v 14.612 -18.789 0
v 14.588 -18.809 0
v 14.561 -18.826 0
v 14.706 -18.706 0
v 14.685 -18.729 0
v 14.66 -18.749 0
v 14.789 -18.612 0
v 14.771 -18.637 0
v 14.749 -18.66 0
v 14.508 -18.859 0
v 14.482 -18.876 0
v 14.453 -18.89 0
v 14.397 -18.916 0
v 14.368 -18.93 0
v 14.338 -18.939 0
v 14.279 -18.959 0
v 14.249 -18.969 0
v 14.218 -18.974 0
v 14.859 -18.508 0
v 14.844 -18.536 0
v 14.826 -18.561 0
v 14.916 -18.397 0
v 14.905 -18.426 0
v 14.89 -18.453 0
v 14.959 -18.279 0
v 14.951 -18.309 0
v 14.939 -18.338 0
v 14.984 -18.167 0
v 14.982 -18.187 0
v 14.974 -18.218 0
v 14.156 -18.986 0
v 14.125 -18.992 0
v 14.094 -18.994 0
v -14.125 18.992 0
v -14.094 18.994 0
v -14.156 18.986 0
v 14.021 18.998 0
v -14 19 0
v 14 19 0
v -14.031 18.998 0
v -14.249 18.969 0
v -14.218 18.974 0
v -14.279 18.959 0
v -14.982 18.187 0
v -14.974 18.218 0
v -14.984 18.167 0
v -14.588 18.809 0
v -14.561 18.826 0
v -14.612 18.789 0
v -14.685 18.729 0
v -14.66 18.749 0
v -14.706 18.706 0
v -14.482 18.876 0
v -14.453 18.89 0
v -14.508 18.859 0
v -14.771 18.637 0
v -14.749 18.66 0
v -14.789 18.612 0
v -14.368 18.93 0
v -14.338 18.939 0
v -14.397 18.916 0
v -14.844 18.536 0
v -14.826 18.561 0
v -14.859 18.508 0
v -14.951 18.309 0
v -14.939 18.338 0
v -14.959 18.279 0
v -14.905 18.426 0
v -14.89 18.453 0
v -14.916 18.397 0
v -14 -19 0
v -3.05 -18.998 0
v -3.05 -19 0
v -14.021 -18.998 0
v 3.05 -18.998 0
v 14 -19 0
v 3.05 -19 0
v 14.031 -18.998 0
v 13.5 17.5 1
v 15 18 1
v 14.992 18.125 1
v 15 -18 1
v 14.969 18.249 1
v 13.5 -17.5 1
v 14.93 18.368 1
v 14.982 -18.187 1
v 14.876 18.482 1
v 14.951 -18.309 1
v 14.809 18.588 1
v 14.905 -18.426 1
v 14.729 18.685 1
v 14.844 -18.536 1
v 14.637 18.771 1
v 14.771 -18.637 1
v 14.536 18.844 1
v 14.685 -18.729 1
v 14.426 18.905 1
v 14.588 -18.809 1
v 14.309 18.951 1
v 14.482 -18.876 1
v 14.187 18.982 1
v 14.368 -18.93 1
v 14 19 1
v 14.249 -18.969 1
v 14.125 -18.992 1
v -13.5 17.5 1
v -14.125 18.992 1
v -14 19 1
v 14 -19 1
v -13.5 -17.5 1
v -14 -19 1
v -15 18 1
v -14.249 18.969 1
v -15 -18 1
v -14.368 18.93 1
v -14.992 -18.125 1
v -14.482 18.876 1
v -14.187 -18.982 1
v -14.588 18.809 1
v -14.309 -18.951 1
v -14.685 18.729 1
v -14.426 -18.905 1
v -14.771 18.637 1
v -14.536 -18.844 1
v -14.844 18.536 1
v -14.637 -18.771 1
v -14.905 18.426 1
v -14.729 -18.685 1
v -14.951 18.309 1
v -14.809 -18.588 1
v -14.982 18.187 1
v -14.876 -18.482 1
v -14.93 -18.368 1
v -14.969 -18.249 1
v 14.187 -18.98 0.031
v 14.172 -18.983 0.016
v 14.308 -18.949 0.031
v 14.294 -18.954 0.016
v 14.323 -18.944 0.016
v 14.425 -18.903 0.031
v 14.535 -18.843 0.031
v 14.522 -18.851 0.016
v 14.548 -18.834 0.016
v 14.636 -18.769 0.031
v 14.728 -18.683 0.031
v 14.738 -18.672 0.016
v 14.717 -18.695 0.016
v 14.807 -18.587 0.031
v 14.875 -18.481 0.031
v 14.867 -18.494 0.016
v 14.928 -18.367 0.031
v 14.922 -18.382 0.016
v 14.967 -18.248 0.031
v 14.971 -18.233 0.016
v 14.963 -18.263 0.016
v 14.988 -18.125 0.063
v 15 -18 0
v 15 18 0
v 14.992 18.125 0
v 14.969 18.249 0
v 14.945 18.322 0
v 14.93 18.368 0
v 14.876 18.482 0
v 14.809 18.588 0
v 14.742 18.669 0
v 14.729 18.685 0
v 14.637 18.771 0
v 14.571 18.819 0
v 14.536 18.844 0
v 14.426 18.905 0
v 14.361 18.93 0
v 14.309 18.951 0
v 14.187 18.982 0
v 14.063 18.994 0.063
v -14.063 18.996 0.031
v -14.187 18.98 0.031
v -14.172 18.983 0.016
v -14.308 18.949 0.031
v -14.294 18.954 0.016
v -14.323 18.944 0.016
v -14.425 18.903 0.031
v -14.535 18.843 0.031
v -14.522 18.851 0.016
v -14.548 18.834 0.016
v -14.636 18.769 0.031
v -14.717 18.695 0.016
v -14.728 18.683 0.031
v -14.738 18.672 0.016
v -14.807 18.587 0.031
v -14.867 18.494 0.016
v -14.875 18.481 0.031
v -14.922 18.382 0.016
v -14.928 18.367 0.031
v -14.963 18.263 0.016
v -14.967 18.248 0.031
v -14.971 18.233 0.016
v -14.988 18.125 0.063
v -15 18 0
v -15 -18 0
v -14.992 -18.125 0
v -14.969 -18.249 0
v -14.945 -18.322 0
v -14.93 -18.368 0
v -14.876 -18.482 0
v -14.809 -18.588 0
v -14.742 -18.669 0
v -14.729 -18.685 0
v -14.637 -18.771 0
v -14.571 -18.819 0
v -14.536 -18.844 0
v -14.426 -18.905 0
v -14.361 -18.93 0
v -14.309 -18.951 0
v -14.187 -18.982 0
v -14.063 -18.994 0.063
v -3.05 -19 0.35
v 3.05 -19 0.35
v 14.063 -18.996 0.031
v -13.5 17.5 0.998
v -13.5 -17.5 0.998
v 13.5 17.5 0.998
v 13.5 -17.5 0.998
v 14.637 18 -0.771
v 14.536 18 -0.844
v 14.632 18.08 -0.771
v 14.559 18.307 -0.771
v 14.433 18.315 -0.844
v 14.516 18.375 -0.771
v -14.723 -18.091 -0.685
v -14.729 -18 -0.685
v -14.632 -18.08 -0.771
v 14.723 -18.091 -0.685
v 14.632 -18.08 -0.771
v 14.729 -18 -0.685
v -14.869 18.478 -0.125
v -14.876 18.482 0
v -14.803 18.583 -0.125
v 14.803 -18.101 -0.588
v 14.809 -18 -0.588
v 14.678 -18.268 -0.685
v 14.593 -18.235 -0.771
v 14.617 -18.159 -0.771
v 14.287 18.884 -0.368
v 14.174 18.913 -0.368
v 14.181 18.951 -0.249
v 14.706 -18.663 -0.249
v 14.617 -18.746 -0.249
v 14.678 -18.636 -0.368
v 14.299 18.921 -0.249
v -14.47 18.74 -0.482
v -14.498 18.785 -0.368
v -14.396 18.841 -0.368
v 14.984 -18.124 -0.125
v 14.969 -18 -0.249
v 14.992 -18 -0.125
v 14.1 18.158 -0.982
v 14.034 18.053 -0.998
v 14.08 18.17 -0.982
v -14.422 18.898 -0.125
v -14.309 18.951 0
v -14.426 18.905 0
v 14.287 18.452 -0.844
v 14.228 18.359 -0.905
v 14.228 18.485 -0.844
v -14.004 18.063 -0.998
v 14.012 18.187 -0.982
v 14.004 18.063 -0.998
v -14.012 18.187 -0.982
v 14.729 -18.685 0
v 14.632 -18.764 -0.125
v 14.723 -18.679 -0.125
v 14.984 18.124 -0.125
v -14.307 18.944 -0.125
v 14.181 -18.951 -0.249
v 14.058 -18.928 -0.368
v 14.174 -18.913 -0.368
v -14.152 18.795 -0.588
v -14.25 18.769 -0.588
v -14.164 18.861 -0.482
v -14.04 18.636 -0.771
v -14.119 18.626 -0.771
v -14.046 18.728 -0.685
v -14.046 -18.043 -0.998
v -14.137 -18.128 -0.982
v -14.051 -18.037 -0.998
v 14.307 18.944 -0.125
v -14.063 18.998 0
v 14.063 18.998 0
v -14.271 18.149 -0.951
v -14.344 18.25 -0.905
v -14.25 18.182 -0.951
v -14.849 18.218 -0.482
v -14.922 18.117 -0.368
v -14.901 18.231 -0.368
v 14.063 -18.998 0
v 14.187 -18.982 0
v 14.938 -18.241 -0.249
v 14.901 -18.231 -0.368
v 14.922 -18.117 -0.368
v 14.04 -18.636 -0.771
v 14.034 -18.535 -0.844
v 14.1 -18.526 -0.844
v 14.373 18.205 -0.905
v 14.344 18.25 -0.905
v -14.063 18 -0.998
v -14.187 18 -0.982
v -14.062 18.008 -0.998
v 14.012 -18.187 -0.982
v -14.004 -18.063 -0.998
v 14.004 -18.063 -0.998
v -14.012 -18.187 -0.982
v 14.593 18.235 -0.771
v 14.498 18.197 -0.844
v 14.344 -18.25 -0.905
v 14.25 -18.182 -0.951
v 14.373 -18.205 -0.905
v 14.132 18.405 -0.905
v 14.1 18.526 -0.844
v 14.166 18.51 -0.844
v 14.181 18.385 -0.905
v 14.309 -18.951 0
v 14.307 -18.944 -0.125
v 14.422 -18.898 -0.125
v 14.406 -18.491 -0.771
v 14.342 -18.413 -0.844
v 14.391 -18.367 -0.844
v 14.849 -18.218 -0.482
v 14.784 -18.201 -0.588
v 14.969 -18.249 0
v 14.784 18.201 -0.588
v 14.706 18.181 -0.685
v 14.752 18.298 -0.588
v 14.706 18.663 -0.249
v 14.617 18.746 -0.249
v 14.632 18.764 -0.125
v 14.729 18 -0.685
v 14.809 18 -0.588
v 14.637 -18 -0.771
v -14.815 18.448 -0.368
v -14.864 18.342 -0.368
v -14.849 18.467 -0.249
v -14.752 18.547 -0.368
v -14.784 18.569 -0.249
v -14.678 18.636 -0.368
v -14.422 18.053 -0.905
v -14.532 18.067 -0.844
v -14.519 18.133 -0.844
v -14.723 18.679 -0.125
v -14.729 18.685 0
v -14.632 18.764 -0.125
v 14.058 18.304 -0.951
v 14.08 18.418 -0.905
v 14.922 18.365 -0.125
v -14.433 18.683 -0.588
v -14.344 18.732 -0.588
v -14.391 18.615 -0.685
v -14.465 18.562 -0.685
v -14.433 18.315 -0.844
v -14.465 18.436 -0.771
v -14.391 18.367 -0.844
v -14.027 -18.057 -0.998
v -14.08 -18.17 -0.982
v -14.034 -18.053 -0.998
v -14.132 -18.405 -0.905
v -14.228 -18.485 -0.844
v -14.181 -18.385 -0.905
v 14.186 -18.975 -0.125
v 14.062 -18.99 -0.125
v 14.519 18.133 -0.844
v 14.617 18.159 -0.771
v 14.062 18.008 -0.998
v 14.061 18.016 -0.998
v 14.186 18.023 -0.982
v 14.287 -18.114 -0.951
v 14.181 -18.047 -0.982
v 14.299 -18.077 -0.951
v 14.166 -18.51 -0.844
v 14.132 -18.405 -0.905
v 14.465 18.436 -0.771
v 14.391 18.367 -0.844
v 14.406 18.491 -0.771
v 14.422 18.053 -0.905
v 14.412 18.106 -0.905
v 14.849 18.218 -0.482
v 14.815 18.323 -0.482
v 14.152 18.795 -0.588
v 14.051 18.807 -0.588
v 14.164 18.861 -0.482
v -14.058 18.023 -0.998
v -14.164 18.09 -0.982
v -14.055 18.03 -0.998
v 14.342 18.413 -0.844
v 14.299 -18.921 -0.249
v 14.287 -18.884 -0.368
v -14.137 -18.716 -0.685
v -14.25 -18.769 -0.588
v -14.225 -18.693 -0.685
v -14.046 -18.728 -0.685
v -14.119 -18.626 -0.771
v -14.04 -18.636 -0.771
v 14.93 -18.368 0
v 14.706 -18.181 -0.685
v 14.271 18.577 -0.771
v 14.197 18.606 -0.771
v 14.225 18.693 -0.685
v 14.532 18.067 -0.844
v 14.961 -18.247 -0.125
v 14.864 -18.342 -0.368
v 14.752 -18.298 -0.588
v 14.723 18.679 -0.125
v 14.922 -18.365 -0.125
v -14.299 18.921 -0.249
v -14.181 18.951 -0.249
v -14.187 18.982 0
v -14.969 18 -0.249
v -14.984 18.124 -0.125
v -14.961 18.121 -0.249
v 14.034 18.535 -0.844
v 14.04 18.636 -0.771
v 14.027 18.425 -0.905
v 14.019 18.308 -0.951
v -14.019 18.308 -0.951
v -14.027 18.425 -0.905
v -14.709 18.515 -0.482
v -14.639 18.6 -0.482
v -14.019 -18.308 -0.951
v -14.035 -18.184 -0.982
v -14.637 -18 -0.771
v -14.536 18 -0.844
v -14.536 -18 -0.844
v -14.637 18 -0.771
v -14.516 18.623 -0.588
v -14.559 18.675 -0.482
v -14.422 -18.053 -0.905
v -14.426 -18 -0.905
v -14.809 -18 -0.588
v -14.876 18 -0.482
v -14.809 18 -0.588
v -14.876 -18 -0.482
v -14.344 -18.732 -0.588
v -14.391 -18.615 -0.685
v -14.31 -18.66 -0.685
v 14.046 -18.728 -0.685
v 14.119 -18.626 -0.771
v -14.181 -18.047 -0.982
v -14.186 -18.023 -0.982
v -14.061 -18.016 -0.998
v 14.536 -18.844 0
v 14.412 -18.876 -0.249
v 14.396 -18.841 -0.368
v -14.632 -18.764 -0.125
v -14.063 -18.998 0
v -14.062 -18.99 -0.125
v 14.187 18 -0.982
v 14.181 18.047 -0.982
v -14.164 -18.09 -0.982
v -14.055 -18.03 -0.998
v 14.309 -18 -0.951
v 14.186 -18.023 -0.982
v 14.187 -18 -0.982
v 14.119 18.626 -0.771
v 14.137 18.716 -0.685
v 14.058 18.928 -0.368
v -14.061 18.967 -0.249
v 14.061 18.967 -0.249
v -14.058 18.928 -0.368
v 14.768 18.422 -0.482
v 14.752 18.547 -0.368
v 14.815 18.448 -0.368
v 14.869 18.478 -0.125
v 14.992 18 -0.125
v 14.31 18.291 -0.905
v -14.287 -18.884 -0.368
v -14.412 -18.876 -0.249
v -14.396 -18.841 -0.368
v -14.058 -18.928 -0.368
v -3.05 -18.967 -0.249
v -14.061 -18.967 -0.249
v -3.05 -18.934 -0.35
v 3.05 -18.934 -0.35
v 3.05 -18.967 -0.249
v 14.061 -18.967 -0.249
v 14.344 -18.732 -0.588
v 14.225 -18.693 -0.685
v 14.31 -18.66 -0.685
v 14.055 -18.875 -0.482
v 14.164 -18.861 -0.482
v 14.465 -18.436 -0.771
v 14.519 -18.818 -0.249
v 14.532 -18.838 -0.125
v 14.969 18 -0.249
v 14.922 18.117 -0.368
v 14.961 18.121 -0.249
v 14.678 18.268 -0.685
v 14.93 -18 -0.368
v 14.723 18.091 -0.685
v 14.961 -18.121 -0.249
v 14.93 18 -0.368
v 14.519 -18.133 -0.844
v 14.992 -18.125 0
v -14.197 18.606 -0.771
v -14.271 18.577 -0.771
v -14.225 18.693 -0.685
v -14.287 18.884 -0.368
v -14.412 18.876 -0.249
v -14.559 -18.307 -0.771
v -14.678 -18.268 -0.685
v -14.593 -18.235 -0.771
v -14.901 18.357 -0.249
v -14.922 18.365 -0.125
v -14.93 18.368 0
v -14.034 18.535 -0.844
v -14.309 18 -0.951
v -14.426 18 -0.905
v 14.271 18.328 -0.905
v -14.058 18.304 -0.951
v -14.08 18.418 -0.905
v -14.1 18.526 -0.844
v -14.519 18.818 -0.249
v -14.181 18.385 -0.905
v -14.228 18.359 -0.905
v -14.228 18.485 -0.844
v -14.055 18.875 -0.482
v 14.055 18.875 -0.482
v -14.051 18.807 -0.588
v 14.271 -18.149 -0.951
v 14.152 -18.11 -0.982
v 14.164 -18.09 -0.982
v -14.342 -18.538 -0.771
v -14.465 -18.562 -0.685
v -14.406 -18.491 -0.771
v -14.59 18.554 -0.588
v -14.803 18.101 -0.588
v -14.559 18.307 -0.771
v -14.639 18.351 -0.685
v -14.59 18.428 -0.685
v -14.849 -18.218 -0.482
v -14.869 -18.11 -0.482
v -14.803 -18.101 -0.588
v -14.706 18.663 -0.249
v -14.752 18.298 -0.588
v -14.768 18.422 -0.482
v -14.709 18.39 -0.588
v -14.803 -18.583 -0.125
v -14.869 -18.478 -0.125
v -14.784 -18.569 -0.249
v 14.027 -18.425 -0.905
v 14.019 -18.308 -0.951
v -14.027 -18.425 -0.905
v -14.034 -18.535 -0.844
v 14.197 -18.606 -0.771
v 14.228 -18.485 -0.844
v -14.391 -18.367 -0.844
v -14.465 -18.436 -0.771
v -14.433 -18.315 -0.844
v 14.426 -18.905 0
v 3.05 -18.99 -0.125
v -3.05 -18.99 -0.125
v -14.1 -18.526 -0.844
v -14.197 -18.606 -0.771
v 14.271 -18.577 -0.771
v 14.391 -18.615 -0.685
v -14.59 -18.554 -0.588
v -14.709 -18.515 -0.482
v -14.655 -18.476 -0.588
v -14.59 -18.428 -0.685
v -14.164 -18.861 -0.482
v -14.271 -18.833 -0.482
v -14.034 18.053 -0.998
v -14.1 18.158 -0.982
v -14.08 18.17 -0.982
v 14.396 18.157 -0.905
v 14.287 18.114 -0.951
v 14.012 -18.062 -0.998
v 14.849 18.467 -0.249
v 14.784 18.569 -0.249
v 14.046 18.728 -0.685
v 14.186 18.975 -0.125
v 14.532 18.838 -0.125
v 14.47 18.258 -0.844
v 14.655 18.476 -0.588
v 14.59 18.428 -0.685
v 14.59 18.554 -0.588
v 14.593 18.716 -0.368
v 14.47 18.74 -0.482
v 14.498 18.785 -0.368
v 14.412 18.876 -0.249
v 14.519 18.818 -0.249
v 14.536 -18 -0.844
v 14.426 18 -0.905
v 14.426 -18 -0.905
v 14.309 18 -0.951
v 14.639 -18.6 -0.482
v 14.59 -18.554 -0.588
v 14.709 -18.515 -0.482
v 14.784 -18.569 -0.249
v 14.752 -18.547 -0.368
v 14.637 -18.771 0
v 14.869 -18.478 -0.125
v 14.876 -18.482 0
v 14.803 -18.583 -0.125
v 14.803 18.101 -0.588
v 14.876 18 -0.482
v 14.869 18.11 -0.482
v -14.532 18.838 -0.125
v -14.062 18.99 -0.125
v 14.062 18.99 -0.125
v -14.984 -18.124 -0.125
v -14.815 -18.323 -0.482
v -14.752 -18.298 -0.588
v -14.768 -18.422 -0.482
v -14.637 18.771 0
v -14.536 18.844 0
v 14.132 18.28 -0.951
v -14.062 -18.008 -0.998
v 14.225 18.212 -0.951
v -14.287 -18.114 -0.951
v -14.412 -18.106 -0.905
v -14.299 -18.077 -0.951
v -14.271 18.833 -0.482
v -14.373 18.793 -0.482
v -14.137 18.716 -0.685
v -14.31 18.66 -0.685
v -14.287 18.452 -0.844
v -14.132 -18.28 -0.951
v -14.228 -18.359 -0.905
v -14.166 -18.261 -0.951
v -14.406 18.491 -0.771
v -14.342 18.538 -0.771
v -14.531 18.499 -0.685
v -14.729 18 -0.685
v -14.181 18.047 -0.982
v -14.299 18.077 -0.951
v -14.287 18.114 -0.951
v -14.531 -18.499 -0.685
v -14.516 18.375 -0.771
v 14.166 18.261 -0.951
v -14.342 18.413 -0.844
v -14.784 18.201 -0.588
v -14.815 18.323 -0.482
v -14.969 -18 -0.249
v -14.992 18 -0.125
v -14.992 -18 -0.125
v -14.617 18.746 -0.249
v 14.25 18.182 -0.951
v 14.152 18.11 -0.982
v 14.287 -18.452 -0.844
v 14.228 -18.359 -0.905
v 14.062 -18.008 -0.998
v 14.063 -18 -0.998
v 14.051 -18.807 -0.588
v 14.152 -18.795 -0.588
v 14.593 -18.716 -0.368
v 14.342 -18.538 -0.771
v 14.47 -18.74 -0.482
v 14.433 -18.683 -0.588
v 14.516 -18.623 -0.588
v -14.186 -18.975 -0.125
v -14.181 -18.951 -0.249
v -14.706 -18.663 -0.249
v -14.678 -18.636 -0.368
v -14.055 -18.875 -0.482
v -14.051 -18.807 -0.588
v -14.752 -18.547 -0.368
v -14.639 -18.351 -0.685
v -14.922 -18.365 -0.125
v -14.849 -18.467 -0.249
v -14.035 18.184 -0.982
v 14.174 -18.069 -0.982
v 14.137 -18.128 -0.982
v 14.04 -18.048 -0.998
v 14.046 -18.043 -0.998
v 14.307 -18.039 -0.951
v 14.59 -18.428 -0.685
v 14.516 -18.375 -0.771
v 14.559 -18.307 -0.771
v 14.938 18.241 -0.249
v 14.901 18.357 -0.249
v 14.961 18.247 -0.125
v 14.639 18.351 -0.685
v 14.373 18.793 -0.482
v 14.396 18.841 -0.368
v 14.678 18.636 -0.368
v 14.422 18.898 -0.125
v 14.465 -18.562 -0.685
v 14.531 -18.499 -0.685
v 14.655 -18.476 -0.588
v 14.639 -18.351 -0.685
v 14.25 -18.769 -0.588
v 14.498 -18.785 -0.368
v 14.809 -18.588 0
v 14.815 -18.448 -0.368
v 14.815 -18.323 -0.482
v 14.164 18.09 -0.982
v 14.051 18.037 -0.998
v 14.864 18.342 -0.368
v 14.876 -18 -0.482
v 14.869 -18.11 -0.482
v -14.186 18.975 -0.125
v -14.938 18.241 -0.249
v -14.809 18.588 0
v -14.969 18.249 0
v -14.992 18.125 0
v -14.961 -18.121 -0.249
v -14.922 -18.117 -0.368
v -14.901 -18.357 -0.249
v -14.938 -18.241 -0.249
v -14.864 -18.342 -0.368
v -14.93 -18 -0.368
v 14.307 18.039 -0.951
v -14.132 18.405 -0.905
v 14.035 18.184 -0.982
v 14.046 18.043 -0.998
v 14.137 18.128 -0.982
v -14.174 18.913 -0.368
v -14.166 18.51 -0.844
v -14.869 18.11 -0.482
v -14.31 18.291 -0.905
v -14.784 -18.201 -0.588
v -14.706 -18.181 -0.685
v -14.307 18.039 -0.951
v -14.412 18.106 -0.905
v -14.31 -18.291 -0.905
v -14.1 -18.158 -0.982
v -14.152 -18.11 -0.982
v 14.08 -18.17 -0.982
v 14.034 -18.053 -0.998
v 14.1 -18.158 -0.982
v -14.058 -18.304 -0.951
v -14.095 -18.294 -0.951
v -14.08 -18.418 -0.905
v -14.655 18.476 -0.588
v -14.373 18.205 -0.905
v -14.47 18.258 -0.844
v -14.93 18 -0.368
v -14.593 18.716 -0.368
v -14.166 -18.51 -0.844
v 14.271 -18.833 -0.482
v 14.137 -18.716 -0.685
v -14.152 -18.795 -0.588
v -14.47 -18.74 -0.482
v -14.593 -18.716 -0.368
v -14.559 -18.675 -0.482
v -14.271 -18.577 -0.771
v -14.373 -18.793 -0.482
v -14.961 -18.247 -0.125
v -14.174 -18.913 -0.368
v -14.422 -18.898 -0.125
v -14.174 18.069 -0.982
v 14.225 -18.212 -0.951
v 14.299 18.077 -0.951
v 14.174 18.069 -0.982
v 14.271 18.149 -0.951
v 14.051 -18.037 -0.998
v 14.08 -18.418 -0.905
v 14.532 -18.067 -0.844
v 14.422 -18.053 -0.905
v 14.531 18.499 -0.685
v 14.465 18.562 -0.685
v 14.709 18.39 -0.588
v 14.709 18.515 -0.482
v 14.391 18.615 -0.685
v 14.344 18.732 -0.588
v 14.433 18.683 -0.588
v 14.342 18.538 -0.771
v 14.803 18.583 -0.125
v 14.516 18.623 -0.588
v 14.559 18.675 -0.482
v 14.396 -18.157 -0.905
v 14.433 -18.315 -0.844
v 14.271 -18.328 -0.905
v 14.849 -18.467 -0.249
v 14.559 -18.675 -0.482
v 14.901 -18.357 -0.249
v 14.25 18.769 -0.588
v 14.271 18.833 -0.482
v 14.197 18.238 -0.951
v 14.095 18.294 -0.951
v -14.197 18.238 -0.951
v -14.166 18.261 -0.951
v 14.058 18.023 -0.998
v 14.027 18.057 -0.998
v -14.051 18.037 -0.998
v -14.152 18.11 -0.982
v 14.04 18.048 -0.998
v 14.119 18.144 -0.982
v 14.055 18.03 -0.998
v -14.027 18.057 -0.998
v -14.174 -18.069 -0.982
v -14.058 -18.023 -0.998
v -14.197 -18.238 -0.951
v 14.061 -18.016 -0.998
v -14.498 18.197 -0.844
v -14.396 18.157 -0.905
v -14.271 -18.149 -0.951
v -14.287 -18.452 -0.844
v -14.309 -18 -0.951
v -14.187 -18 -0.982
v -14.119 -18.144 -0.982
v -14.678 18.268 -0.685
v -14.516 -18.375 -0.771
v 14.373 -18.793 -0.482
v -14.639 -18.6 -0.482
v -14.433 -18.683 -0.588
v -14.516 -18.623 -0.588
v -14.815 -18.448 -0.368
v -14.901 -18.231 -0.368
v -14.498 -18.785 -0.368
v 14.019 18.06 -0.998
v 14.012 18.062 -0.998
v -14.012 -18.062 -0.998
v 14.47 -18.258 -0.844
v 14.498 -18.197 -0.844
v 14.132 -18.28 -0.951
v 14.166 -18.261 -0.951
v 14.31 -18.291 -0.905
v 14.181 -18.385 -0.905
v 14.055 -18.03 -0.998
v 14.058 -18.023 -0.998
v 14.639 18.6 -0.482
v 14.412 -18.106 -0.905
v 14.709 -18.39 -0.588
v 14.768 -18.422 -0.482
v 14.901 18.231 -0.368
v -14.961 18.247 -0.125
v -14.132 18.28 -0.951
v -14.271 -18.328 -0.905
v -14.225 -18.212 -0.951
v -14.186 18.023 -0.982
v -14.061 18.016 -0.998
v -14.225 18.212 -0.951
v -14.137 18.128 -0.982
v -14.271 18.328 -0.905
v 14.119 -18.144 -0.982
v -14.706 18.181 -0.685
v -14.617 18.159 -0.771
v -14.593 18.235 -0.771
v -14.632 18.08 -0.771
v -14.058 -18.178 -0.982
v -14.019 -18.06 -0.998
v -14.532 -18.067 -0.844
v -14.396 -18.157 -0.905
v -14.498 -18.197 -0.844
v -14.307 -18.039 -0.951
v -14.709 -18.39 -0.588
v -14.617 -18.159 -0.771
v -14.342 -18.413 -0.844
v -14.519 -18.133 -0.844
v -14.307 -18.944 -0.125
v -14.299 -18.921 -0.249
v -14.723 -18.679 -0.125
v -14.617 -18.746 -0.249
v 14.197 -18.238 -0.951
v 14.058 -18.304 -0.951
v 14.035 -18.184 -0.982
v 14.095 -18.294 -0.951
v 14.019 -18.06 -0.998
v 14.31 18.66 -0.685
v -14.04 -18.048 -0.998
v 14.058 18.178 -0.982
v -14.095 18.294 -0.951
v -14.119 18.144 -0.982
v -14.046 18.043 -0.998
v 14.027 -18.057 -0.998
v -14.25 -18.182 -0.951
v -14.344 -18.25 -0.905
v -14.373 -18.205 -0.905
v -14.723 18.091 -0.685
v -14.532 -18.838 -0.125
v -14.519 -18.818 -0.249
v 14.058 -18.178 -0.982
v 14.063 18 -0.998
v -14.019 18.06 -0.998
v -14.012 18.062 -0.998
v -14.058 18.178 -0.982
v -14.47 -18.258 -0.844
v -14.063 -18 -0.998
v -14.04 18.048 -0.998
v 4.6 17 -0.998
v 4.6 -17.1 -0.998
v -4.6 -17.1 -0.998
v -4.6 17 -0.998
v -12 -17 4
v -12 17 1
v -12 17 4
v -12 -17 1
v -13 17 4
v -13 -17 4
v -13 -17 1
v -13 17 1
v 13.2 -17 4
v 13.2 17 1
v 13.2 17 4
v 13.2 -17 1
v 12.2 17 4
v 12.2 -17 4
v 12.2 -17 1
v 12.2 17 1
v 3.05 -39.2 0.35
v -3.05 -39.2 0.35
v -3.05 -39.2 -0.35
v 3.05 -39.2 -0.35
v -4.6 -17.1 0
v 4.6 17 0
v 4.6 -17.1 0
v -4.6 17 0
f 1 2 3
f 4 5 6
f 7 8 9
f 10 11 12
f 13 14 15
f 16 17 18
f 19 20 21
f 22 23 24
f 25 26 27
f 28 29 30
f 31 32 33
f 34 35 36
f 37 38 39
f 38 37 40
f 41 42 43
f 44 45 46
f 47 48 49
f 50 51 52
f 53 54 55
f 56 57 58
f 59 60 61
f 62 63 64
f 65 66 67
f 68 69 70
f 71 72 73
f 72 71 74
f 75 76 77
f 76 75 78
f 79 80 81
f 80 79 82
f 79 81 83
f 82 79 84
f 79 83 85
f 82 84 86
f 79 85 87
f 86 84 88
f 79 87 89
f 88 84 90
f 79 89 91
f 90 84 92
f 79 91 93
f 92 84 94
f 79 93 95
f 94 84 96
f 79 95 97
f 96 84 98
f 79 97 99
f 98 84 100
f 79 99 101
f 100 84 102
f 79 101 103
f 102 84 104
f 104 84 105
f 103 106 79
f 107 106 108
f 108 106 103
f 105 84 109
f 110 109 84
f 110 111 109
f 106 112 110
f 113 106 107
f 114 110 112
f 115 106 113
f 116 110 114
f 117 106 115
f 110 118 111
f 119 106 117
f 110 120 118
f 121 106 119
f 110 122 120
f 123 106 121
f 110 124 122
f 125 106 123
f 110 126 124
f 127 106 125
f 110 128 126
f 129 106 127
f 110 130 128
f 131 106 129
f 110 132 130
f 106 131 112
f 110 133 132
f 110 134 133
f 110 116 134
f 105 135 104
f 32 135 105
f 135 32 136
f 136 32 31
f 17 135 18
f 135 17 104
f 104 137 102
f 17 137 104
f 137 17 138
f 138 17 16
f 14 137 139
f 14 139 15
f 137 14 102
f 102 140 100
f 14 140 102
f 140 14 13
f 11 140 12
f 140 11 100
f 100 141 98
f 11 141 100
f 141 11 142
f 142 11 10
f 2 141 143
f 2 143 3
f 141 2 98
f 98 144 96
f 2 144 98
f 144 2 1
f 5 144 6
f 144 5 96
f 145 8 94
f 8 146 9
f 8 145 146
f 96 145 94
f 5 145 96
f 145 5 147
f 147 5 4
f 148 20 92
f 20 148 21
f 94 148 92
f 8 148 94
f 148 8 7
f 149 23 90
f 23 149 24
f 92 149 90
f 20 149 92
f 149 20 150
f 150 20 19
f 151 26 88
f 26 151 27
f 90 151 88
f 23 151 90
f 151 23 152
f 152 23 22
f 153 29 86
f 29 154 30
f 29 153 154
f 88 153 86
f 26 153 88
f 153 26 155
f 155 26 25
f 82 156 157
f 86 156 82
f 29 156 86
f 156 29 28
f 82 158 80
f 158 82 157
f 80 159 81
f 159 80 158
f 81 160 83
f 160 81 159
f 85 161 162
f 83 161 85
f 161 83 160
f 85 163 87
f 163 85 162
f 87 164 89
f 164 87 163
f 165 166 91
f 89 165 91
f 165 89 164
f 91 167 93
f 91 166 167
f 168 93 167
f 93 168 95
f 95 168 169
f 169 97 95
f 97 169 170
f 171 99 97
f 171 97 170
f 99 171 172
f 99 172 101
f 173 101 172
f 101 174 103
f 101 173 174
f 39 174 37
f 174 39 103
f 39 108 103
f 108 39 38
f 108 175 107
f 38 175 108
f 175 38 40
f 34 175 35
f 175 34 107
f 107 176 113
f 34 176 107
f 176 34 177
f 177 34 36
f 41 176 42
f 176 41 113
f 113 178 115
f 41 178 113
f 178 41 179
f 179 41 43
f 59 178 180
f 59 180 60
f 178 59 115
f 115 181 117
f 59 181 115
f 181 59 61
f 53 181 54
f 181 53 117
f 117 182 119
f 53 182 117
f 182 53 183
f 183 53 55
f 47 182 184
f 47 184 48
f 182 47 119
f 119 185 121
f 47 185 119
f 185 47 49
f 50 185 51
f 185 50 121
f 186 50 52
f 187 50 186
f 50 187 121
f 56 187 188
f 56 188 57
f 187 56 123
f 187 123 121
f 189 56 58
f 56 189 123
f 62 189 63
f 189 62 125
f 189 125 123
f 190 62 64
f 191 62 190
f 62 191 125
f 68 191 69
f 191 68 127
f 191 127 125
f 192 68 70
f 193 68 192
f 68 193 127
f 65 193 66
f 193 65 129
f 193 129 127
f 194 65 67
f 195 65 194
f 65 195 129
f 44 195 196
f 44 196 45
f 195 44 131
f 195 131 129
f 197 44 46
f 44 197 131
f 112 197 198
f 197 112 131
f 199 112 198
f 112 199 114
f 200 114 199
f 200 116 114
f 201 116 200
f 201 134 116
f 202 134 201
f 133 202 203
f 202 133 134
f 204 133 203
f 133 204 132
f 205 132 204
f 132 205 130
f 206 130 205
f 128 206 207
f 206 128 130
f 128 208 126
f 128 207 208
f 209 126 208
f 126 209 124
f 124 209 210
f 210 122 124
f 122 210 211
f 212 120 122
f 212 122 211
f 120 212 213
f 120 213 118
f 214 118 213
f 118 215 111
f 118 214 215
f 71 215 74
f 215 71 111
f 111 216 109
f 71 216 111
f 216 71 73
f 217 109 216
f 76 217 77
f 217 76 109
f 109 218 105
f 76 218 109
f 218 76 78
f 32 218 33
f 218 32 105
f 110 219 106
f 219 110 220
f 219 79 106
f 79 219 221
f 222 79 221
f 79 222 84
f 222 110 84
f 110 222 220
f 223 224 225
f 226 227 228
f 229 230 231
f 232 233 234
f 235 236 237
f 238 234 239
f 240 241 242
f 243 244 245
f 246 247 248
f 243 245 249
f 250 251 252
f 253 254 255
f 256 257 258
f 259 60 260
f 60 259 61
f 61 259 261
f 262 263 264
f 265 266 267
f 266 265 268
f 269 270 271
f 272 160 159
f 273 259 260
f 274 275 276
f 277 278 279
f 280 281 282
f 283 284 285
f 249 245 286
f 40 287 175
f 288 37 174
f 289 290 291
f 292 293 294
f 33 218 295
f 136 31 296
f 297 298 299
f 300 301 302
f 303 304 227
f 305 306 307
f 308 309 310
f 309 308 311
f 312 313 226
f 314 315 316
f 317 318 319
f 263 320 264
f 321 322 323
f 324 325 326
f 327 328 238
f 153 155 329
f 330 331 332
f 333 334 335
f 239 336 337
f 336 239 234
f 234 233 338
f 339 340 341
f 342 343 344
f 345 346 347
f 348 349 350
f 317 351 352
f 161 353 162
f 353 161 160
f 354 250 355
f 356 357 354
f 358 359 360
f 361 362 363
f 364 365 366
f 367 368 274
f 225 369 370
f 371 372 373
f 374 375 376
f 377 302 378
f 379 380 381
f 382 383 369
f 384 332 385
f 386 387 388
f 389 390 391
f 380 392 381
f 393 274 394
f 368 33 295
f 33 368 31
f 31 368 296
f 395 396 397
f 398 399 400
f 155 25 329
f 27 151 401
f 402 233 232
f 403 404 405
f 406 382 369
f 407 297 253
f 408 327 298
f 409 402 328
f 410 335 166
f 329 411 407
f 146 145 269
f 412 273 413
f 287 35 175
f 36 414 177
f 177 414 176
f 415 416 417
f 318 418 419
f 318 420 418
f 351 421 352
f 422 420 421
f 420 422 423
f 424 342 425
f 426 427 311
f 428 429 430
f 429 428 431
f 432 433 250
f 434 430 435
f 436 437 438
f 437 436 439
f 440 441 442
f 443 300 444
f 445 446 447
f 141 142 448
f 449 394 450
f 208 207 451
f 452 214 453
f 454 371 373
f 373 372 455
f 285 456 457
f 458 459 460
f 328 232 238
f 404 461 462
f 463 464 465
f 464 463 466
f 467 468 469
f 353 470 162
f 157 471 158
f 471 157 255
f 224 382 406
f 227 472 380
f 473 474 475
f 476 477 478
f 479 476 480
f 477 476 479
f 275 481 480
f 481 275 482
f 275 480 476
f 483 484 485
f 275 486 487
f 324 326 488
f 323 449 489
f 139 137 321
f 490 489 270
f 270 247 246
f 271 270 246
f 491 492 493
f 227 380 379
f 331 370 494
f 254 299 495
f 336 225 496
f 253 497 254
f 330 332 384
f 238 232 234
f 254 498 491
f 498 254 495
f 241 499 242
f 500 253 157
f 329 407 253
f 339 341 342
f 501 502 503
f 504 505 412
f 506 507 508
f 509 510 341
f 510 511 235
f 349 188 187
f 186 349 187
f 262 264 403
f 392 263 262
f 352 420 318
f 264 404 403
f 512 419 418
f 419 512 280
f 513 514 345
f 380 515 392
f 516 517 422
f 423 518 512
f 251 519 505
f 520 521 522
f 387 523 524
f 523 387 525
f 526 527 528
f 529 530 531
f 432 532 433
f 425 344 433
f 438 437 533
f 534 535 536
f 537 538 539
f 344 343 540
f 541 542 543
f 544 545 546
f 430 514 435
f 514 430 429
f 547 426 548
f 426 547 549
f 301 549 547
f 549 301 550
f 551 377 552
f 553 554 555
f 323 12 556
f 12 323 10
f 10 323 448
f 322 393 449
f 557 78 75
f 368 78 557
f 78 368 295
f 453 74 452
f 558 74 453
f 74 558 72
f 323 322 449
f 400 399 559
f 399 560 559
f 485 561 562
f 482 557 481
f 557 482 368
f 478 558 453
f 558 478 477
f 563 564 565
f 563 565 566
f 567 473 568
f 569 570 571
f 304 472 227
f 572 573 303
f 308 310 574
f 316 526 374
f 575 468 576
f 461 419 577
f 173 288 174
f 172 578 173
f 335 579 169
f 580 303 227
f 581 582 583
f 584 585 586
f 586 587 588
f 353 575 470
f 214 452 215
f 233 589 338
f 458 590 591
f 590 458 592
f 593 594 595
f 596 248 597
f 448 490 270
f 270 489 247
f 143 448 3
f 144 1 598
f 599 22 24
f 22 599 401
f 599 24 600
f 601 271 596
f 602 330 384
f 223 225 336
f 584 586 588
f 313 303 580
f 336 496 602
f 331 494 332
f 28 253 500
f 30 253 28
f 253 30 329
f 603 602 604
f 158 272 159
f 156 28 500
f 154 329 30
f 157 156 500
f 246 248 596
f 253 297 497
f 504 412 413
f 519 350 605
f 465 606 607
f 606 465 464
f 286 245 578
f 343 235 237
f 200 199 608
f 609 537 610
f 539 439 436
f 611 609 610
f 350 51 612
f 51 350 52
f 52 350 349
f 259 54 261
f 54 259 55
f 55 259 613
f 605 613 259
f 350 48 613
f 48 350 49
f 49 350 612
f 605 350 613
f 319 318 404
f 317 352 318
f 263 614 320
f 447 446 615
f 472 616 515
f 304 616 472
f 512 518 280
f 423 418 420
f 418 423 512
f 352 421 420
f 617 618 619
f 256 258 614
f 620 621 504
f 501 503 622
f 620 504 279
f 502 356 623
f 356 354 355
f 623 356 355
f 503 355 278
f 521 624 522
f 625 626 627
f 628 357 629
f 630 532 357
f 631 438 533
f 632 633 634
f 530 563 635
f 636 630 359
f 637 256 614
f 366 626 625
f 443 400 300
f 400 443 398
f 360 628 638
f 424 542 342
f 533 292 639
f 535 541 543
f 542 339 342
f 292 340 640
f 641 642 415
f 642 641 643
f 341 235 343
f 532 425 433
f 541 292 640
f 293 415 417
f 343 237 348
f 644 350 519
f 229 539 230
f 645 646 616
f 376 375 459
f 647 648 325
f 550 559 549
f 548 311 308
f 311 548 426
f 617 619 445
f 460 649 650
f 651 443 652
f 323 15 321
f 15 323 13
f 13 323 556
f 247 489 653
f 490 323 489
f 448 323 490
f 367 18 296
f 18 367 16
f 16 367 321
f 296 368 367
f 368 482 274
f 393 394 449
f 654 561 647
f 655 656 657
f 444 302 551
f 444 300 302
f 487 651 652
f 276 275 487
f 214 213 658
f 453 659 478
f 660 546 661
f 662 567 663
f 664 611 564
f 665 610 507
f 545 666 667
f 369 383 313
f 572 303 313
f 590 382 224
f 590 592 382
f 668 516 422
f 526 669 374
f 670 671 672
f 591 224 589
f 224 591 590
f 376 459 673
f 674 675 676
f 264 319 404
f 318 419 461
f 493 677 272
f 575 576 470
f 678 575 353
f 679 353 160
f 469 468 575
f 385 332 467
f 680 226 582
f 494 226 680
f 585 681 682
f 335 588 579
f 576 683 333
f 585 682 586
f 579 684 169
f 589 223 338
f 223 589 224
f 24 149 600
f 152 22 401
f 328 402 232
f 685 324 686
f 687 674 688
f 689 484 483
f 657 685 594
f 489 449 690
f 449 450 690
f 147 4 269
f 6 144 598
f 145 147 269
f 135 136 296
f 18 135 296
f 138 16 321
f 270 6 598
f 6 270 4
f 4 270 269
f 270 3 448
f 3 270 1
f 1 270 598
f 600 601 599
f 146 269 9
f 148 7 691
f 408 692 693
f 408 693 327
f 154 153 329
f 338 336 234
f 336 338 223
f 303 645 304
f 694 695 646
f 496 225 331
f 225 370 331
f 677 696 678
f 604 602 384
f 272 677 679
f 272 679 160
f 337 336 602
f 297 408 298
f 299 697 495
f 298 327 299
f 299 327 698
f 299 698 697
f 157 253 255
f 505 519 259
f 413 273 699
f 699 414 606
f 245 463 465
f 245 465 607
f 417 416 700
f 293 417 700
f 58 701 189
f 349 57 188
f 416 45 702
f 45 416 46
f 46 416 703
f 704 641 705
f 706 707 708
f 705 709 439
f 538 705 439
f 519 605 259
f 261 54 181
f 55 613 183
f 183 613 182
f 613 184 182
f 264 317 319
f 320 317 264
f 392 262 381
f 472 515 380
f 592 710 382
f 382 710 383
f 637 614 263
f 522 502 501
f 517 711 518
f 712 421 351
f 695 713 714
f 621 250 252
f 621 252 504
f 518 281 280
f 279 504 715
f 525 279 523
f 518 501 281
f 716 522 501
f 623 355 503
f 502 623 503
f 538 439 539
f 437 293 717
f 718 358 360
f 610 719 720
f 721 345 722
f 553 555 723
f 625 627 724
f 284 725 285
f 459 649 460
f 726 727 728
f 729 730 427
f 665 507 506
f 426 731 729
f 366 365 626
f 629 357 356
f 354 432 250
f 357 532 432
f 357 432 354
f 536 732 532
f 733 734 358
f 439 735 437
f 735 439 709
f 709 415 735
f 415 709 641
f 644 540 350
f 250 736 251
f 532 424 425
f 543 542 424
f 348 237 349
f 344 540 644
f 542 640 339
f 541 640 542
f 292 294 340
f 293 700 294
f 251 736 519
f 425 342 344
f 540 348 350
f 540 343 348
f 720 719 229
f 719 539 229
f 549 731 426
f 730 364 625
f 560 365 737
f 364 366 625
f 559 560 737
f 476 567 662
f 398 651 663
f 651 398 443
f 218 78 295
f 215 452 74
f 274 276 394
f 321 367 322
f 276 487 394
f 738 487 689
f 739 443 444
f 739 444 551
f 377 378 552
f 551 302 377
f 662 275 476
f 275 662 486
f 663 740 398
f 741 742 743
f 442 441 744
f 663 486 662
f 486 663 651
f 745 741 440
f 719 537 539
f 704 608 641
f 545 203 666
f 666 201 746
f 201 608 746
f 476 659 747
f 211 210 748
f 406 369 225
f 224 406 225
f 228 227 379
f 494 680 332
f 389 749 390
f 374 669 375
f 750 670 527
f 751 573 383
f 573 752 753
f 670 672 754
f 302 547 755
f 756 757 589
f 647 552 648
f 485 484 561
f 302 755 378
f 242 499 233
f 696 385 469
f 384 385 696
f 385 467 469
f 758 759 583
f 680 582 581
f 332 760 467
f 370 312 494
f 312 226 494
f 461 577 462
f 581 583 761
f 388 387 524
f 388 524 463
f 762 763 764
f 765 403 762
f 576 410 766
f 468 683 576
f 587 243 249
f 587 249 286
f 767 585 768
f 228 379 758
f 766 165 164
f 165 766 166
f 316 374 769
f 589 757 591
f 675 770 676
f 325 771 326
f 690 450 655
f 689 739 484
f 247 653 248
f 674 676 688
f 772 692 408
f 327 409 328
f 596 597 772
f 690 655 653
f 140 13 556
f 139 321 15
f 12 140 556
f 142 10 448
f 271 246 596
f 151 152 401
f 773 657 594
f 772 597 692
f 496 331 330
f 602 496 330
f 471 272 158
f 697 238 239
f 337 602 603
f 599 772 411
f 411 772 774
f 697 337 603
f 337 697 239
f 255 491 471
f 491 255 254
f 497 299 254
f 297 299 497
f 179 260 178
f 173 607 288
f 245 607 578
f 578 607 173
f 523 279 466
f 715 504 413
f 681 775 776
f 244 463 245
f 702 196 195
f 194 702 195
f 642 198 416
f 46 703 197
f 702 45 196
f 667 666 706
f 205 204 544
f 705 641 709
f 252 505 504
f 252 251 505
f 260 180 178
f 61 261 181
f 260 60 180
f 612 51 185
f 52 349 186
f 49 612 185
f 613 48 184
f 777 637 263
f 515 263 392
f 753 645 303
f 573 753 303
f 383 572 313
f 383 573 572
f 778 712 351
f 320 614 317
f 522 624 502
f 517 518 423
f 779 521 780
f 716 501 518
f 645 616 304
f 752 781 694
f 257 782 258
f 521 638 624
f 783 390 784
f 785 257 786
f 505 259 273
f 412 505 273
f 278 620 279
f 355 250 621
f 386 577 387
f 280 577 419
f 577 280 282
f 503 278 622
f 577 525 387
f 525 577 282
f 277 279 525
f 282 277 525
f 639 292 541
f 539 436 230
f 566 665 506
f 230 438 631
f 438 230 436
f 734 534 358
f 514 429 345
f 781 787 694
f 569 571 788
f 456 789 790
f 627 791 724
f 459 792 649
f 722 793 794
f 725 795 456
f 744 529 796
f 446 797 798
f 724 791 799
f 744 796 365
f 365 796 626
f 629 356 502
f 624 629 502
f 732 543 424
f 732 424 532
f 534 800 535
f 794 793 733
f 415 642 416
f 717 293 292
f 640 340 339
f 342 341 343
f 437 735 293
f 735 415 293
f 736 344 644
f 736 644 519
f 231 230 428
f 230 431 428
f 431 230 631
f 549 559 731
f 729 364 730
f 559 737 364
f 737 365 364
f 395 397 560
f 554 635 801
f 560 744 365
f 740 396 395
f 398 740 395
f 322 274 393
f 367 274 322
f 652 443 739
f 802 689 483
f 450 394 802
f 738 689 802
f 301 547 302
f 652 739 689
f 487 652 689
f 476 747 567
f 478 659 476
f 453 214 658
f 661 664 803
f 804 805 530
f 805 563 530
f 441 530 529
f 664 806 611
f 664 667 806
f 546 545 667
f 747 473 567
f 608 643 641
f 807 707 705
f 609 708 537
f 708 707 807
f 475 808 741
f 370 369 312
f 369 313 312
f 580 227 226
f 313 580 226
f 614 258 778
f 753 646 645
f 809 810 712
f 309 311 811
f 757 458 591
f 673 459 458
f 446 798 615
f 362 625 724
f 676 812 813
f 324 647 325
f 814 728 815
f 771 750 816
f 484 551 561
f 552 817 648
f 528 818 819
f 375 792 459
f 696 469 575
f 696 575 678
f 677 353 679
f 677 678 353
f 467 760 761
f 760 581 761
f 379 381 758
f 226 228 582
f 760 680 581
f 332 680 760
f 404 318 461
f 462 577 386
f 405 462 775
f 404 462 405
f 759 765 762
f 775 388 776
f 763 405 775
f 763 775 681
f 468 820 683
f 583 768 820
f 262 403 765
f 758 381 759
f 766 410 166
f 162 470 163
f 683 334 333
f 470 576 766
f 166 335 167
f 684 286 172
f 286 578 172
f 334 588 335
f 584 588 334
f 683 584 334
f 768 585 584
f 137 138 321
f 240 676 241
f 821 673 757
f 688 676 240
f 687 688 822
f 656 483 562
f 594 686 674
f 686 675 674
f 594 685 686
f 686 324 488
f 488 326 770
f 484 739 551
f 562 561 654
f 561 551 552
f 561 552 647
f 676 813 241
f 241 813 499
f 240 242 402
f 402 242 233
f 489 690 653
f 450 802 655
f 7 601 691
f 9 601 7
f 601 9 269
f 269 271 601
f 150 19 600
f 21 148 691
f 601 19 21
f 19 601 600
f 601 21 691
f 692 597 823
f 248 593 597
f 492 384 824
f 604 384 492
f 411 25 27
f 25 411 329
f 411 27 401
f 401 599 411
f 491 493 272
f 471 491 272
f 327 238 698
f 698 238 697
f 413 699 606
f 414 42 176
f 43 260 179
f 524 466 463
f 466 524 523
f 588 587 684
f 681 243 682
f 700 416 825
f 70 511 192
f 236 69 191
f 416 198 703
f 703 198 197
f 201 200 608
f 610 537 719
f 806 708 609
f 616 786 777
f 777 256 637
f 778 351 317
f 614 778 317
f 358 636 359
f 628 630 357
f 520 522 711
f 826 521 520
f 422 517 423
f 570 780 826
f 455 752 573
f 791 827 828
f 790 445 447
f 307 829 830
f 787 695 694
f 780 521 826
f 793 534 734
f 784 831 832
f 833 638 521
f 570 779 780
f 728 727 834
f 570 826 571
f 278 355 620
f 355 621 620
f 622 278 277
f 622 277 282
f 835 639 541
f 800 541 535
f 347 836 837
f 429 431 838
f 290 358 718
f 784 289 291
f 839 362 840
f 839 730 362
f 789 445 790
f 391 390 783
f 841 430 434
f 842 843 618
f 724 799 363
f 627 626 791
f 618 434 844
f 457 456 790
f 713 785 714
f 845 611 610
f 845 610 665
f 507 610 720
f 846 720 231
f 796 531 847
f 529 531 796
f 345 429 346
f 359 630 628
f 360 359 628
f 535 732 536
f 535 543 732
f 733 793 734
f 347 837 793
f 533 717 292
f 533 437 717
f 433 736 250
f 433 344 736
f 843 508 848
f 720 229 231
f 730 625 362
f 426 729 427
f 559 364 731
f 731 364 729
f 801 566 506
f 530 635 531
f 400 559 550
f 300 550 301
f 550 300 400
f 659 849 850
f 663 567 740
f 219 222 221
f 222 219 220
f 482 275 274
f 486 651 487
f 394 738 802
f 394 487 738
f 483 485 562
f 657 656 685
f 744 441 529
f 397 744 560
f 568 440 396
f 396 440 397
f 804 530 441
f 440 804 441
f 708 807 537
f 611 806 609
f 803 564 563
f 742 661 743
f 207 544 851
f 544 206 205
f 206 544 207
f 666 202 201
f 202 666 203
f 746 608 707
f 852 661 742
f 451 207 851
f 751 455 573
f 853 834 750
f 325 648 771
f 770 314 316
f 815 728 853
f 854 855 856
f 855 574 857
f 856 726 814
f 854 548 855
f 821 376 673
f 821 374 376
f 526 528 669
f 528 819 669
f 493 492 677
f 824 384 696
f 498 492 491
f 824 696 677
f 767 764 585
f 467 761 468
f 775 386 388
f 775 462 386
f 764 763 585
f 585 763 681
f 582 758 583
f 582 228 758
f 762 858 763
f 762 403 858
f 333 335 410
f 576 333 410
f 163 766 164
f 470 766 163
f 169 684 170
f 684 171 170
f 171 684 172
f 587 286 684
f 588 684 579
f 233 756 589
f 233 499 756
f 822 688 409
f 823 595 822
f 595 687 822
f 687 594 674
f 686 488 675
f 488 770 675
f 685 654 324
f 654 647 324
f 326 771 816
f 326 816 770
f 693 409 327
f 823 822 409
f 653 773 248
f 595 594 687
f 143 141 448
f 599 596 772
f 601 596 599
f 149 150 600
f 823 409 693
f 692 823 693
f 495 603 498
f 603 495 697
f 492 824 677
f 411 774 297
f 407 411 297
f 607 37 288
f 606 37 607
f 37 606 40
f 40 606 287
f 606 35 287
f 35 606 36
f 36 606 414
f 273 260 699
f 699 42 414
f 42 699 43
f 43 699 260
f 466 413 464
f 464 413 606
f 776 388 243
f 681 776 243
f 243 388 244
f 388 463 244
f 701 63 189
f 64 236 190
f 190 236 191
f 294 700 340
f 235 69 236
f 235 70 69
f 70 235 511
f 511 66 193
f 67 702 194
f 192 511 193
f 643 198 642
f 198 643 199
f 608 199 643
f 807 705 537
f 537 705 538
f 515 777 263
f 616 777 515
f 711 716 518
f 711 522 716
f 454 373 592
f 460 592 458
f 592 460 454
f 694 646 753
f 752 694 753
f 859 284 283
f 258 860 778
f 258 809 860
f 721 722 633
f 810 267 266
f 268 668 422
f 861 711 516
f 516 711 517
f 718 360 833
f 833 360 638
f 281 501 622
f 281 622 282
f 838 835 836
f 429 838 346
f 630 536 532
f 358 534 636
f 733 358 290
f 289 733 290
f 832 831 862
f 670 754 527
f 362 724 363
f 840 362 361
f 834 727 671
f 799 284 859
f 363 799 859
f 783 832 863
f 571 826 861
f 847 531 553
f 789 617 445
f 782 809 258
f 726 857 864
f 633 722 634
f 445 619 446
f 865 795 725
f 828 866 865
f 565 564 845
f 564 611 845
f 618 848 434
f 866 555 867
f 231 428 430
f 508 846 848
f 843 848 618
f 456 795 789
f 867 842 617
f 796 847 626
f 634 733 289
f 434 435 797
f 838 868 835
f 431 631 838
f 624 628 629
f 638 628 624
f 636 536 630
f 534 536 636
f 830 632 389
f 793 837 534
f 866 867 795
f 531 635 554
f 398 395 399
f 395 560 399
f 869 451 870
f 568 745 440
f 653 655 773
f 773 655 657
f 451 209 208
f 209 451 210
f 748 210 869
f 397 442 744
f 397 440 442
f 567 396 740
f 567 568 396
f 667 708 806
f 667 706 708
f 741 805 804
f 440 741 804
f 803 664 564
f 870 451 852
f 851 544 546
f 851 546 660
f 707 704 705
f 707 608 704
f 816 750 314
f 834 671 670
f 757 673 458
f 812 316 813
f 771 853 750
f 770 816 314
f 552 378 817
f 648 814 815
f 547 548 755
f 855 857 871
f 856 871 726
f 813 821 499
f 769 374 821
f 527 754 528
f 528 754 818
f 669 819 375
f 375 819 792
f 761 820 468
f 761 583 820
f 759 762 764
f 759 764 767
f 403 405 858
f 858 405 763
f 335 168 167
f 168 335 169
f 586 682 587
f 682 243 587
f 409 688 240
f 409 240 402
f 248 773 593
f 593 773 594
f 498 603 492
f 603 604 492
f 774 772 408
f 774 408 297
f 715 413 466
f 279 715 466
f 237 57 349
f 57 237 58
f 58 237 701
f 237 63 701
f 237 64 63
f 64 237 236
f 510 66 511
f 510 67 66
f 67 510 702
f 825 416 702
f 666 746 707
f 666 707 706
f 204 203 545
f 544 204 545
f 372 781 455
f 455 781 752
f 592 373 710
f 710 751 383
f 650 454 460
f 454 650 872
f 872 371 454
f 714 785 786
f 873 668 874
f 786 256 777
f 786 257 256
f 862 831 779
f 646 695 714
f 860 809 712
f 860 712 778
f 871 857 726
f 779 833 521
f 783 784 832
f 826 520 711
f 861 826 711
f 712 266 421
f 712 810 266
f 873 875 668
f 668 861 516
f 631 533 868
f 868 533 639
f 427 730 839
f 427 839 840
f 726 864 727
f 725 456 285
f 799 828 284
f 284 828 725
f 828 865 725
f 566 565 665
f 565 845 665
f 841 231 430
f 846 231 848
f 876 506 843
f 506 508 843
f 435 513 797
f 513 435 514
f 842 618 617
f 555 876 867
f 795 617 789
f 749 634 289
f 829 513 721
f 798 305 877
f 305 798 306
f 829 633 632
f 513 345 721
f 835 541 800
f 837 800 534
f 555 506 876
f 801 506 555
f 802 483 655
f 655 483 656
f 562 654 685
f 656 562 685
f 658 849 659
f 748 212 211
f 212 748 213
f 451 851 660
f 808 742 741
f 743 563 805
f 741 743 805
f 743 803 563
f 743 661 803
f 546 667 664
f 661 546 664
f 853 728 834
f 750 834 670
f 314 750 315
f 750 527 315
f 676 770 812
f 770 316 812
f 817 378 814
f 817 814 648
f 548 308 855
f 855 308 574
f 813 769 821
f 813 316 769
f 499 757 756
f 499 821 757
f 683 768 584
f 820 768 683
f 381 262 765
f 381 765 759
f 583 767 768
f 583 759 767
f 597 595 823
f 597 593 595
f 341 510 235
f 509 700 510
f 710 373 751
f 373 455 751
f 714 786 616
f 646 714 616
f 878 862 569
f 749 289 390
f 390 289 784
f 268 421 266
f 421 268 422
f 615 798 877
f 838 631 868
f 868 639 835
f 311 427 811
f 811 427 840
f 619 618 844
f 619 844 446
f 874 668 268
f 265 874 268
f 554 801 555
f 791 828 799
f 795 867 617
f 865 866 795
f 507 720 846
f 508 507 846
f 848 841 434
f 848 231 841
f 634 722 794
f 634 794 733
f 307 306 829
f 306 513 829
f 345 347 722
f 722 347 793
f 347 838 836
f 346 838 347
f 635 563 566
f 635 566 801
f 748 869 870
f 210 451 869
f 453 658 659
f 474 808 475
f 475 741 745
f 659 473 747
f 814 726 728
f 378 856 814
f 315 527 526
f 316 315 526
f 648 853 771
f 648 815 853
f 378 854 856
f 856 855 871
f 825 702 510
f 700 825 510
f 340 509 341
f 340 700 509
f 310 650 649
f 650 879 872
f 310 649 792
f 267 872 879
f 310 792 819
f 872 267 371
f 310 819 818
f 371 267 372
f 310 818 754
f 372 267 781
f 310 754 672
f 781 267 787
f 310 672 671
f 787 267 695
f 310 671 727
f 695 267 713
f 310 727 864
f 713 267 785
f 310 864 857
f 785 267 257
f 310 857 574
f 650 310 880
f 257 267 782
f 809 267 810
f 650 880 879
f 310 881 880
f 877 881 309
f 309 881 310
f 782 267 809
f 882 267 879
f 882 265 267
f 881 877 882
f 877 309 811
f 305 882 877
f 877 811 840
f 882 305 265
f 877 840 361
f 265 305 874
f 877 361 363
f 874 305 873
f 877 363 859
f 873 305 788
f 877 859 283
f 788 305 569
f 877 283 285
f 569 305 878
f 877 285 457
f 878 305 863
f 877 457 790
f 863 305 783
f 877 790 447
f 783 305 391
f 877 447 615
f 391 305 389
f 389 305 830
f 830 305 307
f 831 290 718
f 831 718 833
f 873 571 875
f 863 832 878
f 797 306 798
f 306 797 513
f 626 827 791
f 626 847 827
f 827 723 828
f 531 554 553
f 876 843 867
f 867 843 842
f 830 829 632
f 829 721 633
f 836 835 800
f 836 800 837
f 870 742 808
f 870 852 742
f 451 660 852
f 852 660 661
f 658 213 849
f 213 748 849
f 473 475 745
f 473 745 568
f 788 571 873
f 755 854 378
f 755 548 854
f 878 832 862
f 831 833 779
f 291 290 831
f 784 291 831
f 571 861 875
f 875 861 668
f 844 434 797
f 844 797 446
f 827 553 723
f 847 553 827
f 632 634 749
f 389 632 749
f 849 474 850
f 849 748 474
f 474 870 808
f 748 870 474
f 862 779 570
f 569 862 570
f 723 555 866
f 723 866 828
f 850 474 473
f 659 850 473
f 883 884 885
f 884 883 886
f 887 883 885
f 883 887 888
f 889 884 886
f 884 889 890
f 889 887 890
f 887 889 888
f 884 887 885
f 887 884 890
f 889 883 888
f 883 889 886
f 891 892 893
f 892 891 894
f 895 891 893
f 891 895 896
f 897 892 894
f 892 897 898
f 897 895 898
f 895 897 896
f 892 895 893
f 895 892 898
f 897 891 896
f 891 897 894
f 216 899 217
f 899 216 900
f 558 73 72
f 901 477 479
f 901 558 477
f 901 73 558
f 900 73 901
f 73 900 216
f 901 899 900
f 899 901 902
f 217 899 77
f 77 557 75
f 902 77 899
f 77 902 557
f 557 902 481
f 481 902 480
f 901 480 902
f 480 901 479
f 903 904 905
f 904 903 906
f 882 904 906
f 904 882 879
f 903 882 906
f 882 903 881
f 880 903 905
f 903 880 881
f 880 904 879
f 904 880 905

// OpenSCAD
$fn=50;
BOX_W = 28; // Box Width
BOX_L = 36;// Box Length
BOX_H = 1.0; // Box Height
//SCREW_SIZE = .5; // Screw size in mm
CORNER_RADIUS = 1.0; // Radius of corners
WALL = 1.0;// Wall Thickness

KEEL_WIDTH=9.2;
KEEL_HEIGHT=2;
KEEL_LENGTH=32;


difference() {
  union() {
  linear_extrude( BOX_H )
    difference(){
      offset(r=CORNER_RADIUS) square( [BOX_W, BOX_L], center=true );
      offset( r= CORNER_RADIUS - WALL ) square( [BOX_W-WALL, BOX_L-WALL], center=true );
    };

  coordinates = [ [0,0],[0,BOX_L],[BOX_W,BOX_L],[BOX_W,0] ];

  translate ( [-BOX_W/2, -BOX_L/2] )
    hull()
    for (i = coordinates)
      translate(i) sphere(CORNER_RADIUS);

    translate([BOX_W/-2+WALL,BOX_L/-2+1,WALL]) cube([WALL,BOX_L-(WALL*2),3]);

    translate([BOX_W/2-WALL*1.8,BOX_L/-2+1,WALL]) cube([WALL,BOX_L-(WALL*2),3]);

    translate([0,-17,WALL-1])
    rotate([90,0,0])
    linear_extrude(22.2) square([6.1,0.7], center=true);
    
  }
  translate([0,17,BOX_H-2])
  rotate([90,0,0])
  #linear_extrude(KEEL_LENGTH+2.1)
    square([KEEL_WIDTH, KEEL_HEIGHT], center=true);  
}
